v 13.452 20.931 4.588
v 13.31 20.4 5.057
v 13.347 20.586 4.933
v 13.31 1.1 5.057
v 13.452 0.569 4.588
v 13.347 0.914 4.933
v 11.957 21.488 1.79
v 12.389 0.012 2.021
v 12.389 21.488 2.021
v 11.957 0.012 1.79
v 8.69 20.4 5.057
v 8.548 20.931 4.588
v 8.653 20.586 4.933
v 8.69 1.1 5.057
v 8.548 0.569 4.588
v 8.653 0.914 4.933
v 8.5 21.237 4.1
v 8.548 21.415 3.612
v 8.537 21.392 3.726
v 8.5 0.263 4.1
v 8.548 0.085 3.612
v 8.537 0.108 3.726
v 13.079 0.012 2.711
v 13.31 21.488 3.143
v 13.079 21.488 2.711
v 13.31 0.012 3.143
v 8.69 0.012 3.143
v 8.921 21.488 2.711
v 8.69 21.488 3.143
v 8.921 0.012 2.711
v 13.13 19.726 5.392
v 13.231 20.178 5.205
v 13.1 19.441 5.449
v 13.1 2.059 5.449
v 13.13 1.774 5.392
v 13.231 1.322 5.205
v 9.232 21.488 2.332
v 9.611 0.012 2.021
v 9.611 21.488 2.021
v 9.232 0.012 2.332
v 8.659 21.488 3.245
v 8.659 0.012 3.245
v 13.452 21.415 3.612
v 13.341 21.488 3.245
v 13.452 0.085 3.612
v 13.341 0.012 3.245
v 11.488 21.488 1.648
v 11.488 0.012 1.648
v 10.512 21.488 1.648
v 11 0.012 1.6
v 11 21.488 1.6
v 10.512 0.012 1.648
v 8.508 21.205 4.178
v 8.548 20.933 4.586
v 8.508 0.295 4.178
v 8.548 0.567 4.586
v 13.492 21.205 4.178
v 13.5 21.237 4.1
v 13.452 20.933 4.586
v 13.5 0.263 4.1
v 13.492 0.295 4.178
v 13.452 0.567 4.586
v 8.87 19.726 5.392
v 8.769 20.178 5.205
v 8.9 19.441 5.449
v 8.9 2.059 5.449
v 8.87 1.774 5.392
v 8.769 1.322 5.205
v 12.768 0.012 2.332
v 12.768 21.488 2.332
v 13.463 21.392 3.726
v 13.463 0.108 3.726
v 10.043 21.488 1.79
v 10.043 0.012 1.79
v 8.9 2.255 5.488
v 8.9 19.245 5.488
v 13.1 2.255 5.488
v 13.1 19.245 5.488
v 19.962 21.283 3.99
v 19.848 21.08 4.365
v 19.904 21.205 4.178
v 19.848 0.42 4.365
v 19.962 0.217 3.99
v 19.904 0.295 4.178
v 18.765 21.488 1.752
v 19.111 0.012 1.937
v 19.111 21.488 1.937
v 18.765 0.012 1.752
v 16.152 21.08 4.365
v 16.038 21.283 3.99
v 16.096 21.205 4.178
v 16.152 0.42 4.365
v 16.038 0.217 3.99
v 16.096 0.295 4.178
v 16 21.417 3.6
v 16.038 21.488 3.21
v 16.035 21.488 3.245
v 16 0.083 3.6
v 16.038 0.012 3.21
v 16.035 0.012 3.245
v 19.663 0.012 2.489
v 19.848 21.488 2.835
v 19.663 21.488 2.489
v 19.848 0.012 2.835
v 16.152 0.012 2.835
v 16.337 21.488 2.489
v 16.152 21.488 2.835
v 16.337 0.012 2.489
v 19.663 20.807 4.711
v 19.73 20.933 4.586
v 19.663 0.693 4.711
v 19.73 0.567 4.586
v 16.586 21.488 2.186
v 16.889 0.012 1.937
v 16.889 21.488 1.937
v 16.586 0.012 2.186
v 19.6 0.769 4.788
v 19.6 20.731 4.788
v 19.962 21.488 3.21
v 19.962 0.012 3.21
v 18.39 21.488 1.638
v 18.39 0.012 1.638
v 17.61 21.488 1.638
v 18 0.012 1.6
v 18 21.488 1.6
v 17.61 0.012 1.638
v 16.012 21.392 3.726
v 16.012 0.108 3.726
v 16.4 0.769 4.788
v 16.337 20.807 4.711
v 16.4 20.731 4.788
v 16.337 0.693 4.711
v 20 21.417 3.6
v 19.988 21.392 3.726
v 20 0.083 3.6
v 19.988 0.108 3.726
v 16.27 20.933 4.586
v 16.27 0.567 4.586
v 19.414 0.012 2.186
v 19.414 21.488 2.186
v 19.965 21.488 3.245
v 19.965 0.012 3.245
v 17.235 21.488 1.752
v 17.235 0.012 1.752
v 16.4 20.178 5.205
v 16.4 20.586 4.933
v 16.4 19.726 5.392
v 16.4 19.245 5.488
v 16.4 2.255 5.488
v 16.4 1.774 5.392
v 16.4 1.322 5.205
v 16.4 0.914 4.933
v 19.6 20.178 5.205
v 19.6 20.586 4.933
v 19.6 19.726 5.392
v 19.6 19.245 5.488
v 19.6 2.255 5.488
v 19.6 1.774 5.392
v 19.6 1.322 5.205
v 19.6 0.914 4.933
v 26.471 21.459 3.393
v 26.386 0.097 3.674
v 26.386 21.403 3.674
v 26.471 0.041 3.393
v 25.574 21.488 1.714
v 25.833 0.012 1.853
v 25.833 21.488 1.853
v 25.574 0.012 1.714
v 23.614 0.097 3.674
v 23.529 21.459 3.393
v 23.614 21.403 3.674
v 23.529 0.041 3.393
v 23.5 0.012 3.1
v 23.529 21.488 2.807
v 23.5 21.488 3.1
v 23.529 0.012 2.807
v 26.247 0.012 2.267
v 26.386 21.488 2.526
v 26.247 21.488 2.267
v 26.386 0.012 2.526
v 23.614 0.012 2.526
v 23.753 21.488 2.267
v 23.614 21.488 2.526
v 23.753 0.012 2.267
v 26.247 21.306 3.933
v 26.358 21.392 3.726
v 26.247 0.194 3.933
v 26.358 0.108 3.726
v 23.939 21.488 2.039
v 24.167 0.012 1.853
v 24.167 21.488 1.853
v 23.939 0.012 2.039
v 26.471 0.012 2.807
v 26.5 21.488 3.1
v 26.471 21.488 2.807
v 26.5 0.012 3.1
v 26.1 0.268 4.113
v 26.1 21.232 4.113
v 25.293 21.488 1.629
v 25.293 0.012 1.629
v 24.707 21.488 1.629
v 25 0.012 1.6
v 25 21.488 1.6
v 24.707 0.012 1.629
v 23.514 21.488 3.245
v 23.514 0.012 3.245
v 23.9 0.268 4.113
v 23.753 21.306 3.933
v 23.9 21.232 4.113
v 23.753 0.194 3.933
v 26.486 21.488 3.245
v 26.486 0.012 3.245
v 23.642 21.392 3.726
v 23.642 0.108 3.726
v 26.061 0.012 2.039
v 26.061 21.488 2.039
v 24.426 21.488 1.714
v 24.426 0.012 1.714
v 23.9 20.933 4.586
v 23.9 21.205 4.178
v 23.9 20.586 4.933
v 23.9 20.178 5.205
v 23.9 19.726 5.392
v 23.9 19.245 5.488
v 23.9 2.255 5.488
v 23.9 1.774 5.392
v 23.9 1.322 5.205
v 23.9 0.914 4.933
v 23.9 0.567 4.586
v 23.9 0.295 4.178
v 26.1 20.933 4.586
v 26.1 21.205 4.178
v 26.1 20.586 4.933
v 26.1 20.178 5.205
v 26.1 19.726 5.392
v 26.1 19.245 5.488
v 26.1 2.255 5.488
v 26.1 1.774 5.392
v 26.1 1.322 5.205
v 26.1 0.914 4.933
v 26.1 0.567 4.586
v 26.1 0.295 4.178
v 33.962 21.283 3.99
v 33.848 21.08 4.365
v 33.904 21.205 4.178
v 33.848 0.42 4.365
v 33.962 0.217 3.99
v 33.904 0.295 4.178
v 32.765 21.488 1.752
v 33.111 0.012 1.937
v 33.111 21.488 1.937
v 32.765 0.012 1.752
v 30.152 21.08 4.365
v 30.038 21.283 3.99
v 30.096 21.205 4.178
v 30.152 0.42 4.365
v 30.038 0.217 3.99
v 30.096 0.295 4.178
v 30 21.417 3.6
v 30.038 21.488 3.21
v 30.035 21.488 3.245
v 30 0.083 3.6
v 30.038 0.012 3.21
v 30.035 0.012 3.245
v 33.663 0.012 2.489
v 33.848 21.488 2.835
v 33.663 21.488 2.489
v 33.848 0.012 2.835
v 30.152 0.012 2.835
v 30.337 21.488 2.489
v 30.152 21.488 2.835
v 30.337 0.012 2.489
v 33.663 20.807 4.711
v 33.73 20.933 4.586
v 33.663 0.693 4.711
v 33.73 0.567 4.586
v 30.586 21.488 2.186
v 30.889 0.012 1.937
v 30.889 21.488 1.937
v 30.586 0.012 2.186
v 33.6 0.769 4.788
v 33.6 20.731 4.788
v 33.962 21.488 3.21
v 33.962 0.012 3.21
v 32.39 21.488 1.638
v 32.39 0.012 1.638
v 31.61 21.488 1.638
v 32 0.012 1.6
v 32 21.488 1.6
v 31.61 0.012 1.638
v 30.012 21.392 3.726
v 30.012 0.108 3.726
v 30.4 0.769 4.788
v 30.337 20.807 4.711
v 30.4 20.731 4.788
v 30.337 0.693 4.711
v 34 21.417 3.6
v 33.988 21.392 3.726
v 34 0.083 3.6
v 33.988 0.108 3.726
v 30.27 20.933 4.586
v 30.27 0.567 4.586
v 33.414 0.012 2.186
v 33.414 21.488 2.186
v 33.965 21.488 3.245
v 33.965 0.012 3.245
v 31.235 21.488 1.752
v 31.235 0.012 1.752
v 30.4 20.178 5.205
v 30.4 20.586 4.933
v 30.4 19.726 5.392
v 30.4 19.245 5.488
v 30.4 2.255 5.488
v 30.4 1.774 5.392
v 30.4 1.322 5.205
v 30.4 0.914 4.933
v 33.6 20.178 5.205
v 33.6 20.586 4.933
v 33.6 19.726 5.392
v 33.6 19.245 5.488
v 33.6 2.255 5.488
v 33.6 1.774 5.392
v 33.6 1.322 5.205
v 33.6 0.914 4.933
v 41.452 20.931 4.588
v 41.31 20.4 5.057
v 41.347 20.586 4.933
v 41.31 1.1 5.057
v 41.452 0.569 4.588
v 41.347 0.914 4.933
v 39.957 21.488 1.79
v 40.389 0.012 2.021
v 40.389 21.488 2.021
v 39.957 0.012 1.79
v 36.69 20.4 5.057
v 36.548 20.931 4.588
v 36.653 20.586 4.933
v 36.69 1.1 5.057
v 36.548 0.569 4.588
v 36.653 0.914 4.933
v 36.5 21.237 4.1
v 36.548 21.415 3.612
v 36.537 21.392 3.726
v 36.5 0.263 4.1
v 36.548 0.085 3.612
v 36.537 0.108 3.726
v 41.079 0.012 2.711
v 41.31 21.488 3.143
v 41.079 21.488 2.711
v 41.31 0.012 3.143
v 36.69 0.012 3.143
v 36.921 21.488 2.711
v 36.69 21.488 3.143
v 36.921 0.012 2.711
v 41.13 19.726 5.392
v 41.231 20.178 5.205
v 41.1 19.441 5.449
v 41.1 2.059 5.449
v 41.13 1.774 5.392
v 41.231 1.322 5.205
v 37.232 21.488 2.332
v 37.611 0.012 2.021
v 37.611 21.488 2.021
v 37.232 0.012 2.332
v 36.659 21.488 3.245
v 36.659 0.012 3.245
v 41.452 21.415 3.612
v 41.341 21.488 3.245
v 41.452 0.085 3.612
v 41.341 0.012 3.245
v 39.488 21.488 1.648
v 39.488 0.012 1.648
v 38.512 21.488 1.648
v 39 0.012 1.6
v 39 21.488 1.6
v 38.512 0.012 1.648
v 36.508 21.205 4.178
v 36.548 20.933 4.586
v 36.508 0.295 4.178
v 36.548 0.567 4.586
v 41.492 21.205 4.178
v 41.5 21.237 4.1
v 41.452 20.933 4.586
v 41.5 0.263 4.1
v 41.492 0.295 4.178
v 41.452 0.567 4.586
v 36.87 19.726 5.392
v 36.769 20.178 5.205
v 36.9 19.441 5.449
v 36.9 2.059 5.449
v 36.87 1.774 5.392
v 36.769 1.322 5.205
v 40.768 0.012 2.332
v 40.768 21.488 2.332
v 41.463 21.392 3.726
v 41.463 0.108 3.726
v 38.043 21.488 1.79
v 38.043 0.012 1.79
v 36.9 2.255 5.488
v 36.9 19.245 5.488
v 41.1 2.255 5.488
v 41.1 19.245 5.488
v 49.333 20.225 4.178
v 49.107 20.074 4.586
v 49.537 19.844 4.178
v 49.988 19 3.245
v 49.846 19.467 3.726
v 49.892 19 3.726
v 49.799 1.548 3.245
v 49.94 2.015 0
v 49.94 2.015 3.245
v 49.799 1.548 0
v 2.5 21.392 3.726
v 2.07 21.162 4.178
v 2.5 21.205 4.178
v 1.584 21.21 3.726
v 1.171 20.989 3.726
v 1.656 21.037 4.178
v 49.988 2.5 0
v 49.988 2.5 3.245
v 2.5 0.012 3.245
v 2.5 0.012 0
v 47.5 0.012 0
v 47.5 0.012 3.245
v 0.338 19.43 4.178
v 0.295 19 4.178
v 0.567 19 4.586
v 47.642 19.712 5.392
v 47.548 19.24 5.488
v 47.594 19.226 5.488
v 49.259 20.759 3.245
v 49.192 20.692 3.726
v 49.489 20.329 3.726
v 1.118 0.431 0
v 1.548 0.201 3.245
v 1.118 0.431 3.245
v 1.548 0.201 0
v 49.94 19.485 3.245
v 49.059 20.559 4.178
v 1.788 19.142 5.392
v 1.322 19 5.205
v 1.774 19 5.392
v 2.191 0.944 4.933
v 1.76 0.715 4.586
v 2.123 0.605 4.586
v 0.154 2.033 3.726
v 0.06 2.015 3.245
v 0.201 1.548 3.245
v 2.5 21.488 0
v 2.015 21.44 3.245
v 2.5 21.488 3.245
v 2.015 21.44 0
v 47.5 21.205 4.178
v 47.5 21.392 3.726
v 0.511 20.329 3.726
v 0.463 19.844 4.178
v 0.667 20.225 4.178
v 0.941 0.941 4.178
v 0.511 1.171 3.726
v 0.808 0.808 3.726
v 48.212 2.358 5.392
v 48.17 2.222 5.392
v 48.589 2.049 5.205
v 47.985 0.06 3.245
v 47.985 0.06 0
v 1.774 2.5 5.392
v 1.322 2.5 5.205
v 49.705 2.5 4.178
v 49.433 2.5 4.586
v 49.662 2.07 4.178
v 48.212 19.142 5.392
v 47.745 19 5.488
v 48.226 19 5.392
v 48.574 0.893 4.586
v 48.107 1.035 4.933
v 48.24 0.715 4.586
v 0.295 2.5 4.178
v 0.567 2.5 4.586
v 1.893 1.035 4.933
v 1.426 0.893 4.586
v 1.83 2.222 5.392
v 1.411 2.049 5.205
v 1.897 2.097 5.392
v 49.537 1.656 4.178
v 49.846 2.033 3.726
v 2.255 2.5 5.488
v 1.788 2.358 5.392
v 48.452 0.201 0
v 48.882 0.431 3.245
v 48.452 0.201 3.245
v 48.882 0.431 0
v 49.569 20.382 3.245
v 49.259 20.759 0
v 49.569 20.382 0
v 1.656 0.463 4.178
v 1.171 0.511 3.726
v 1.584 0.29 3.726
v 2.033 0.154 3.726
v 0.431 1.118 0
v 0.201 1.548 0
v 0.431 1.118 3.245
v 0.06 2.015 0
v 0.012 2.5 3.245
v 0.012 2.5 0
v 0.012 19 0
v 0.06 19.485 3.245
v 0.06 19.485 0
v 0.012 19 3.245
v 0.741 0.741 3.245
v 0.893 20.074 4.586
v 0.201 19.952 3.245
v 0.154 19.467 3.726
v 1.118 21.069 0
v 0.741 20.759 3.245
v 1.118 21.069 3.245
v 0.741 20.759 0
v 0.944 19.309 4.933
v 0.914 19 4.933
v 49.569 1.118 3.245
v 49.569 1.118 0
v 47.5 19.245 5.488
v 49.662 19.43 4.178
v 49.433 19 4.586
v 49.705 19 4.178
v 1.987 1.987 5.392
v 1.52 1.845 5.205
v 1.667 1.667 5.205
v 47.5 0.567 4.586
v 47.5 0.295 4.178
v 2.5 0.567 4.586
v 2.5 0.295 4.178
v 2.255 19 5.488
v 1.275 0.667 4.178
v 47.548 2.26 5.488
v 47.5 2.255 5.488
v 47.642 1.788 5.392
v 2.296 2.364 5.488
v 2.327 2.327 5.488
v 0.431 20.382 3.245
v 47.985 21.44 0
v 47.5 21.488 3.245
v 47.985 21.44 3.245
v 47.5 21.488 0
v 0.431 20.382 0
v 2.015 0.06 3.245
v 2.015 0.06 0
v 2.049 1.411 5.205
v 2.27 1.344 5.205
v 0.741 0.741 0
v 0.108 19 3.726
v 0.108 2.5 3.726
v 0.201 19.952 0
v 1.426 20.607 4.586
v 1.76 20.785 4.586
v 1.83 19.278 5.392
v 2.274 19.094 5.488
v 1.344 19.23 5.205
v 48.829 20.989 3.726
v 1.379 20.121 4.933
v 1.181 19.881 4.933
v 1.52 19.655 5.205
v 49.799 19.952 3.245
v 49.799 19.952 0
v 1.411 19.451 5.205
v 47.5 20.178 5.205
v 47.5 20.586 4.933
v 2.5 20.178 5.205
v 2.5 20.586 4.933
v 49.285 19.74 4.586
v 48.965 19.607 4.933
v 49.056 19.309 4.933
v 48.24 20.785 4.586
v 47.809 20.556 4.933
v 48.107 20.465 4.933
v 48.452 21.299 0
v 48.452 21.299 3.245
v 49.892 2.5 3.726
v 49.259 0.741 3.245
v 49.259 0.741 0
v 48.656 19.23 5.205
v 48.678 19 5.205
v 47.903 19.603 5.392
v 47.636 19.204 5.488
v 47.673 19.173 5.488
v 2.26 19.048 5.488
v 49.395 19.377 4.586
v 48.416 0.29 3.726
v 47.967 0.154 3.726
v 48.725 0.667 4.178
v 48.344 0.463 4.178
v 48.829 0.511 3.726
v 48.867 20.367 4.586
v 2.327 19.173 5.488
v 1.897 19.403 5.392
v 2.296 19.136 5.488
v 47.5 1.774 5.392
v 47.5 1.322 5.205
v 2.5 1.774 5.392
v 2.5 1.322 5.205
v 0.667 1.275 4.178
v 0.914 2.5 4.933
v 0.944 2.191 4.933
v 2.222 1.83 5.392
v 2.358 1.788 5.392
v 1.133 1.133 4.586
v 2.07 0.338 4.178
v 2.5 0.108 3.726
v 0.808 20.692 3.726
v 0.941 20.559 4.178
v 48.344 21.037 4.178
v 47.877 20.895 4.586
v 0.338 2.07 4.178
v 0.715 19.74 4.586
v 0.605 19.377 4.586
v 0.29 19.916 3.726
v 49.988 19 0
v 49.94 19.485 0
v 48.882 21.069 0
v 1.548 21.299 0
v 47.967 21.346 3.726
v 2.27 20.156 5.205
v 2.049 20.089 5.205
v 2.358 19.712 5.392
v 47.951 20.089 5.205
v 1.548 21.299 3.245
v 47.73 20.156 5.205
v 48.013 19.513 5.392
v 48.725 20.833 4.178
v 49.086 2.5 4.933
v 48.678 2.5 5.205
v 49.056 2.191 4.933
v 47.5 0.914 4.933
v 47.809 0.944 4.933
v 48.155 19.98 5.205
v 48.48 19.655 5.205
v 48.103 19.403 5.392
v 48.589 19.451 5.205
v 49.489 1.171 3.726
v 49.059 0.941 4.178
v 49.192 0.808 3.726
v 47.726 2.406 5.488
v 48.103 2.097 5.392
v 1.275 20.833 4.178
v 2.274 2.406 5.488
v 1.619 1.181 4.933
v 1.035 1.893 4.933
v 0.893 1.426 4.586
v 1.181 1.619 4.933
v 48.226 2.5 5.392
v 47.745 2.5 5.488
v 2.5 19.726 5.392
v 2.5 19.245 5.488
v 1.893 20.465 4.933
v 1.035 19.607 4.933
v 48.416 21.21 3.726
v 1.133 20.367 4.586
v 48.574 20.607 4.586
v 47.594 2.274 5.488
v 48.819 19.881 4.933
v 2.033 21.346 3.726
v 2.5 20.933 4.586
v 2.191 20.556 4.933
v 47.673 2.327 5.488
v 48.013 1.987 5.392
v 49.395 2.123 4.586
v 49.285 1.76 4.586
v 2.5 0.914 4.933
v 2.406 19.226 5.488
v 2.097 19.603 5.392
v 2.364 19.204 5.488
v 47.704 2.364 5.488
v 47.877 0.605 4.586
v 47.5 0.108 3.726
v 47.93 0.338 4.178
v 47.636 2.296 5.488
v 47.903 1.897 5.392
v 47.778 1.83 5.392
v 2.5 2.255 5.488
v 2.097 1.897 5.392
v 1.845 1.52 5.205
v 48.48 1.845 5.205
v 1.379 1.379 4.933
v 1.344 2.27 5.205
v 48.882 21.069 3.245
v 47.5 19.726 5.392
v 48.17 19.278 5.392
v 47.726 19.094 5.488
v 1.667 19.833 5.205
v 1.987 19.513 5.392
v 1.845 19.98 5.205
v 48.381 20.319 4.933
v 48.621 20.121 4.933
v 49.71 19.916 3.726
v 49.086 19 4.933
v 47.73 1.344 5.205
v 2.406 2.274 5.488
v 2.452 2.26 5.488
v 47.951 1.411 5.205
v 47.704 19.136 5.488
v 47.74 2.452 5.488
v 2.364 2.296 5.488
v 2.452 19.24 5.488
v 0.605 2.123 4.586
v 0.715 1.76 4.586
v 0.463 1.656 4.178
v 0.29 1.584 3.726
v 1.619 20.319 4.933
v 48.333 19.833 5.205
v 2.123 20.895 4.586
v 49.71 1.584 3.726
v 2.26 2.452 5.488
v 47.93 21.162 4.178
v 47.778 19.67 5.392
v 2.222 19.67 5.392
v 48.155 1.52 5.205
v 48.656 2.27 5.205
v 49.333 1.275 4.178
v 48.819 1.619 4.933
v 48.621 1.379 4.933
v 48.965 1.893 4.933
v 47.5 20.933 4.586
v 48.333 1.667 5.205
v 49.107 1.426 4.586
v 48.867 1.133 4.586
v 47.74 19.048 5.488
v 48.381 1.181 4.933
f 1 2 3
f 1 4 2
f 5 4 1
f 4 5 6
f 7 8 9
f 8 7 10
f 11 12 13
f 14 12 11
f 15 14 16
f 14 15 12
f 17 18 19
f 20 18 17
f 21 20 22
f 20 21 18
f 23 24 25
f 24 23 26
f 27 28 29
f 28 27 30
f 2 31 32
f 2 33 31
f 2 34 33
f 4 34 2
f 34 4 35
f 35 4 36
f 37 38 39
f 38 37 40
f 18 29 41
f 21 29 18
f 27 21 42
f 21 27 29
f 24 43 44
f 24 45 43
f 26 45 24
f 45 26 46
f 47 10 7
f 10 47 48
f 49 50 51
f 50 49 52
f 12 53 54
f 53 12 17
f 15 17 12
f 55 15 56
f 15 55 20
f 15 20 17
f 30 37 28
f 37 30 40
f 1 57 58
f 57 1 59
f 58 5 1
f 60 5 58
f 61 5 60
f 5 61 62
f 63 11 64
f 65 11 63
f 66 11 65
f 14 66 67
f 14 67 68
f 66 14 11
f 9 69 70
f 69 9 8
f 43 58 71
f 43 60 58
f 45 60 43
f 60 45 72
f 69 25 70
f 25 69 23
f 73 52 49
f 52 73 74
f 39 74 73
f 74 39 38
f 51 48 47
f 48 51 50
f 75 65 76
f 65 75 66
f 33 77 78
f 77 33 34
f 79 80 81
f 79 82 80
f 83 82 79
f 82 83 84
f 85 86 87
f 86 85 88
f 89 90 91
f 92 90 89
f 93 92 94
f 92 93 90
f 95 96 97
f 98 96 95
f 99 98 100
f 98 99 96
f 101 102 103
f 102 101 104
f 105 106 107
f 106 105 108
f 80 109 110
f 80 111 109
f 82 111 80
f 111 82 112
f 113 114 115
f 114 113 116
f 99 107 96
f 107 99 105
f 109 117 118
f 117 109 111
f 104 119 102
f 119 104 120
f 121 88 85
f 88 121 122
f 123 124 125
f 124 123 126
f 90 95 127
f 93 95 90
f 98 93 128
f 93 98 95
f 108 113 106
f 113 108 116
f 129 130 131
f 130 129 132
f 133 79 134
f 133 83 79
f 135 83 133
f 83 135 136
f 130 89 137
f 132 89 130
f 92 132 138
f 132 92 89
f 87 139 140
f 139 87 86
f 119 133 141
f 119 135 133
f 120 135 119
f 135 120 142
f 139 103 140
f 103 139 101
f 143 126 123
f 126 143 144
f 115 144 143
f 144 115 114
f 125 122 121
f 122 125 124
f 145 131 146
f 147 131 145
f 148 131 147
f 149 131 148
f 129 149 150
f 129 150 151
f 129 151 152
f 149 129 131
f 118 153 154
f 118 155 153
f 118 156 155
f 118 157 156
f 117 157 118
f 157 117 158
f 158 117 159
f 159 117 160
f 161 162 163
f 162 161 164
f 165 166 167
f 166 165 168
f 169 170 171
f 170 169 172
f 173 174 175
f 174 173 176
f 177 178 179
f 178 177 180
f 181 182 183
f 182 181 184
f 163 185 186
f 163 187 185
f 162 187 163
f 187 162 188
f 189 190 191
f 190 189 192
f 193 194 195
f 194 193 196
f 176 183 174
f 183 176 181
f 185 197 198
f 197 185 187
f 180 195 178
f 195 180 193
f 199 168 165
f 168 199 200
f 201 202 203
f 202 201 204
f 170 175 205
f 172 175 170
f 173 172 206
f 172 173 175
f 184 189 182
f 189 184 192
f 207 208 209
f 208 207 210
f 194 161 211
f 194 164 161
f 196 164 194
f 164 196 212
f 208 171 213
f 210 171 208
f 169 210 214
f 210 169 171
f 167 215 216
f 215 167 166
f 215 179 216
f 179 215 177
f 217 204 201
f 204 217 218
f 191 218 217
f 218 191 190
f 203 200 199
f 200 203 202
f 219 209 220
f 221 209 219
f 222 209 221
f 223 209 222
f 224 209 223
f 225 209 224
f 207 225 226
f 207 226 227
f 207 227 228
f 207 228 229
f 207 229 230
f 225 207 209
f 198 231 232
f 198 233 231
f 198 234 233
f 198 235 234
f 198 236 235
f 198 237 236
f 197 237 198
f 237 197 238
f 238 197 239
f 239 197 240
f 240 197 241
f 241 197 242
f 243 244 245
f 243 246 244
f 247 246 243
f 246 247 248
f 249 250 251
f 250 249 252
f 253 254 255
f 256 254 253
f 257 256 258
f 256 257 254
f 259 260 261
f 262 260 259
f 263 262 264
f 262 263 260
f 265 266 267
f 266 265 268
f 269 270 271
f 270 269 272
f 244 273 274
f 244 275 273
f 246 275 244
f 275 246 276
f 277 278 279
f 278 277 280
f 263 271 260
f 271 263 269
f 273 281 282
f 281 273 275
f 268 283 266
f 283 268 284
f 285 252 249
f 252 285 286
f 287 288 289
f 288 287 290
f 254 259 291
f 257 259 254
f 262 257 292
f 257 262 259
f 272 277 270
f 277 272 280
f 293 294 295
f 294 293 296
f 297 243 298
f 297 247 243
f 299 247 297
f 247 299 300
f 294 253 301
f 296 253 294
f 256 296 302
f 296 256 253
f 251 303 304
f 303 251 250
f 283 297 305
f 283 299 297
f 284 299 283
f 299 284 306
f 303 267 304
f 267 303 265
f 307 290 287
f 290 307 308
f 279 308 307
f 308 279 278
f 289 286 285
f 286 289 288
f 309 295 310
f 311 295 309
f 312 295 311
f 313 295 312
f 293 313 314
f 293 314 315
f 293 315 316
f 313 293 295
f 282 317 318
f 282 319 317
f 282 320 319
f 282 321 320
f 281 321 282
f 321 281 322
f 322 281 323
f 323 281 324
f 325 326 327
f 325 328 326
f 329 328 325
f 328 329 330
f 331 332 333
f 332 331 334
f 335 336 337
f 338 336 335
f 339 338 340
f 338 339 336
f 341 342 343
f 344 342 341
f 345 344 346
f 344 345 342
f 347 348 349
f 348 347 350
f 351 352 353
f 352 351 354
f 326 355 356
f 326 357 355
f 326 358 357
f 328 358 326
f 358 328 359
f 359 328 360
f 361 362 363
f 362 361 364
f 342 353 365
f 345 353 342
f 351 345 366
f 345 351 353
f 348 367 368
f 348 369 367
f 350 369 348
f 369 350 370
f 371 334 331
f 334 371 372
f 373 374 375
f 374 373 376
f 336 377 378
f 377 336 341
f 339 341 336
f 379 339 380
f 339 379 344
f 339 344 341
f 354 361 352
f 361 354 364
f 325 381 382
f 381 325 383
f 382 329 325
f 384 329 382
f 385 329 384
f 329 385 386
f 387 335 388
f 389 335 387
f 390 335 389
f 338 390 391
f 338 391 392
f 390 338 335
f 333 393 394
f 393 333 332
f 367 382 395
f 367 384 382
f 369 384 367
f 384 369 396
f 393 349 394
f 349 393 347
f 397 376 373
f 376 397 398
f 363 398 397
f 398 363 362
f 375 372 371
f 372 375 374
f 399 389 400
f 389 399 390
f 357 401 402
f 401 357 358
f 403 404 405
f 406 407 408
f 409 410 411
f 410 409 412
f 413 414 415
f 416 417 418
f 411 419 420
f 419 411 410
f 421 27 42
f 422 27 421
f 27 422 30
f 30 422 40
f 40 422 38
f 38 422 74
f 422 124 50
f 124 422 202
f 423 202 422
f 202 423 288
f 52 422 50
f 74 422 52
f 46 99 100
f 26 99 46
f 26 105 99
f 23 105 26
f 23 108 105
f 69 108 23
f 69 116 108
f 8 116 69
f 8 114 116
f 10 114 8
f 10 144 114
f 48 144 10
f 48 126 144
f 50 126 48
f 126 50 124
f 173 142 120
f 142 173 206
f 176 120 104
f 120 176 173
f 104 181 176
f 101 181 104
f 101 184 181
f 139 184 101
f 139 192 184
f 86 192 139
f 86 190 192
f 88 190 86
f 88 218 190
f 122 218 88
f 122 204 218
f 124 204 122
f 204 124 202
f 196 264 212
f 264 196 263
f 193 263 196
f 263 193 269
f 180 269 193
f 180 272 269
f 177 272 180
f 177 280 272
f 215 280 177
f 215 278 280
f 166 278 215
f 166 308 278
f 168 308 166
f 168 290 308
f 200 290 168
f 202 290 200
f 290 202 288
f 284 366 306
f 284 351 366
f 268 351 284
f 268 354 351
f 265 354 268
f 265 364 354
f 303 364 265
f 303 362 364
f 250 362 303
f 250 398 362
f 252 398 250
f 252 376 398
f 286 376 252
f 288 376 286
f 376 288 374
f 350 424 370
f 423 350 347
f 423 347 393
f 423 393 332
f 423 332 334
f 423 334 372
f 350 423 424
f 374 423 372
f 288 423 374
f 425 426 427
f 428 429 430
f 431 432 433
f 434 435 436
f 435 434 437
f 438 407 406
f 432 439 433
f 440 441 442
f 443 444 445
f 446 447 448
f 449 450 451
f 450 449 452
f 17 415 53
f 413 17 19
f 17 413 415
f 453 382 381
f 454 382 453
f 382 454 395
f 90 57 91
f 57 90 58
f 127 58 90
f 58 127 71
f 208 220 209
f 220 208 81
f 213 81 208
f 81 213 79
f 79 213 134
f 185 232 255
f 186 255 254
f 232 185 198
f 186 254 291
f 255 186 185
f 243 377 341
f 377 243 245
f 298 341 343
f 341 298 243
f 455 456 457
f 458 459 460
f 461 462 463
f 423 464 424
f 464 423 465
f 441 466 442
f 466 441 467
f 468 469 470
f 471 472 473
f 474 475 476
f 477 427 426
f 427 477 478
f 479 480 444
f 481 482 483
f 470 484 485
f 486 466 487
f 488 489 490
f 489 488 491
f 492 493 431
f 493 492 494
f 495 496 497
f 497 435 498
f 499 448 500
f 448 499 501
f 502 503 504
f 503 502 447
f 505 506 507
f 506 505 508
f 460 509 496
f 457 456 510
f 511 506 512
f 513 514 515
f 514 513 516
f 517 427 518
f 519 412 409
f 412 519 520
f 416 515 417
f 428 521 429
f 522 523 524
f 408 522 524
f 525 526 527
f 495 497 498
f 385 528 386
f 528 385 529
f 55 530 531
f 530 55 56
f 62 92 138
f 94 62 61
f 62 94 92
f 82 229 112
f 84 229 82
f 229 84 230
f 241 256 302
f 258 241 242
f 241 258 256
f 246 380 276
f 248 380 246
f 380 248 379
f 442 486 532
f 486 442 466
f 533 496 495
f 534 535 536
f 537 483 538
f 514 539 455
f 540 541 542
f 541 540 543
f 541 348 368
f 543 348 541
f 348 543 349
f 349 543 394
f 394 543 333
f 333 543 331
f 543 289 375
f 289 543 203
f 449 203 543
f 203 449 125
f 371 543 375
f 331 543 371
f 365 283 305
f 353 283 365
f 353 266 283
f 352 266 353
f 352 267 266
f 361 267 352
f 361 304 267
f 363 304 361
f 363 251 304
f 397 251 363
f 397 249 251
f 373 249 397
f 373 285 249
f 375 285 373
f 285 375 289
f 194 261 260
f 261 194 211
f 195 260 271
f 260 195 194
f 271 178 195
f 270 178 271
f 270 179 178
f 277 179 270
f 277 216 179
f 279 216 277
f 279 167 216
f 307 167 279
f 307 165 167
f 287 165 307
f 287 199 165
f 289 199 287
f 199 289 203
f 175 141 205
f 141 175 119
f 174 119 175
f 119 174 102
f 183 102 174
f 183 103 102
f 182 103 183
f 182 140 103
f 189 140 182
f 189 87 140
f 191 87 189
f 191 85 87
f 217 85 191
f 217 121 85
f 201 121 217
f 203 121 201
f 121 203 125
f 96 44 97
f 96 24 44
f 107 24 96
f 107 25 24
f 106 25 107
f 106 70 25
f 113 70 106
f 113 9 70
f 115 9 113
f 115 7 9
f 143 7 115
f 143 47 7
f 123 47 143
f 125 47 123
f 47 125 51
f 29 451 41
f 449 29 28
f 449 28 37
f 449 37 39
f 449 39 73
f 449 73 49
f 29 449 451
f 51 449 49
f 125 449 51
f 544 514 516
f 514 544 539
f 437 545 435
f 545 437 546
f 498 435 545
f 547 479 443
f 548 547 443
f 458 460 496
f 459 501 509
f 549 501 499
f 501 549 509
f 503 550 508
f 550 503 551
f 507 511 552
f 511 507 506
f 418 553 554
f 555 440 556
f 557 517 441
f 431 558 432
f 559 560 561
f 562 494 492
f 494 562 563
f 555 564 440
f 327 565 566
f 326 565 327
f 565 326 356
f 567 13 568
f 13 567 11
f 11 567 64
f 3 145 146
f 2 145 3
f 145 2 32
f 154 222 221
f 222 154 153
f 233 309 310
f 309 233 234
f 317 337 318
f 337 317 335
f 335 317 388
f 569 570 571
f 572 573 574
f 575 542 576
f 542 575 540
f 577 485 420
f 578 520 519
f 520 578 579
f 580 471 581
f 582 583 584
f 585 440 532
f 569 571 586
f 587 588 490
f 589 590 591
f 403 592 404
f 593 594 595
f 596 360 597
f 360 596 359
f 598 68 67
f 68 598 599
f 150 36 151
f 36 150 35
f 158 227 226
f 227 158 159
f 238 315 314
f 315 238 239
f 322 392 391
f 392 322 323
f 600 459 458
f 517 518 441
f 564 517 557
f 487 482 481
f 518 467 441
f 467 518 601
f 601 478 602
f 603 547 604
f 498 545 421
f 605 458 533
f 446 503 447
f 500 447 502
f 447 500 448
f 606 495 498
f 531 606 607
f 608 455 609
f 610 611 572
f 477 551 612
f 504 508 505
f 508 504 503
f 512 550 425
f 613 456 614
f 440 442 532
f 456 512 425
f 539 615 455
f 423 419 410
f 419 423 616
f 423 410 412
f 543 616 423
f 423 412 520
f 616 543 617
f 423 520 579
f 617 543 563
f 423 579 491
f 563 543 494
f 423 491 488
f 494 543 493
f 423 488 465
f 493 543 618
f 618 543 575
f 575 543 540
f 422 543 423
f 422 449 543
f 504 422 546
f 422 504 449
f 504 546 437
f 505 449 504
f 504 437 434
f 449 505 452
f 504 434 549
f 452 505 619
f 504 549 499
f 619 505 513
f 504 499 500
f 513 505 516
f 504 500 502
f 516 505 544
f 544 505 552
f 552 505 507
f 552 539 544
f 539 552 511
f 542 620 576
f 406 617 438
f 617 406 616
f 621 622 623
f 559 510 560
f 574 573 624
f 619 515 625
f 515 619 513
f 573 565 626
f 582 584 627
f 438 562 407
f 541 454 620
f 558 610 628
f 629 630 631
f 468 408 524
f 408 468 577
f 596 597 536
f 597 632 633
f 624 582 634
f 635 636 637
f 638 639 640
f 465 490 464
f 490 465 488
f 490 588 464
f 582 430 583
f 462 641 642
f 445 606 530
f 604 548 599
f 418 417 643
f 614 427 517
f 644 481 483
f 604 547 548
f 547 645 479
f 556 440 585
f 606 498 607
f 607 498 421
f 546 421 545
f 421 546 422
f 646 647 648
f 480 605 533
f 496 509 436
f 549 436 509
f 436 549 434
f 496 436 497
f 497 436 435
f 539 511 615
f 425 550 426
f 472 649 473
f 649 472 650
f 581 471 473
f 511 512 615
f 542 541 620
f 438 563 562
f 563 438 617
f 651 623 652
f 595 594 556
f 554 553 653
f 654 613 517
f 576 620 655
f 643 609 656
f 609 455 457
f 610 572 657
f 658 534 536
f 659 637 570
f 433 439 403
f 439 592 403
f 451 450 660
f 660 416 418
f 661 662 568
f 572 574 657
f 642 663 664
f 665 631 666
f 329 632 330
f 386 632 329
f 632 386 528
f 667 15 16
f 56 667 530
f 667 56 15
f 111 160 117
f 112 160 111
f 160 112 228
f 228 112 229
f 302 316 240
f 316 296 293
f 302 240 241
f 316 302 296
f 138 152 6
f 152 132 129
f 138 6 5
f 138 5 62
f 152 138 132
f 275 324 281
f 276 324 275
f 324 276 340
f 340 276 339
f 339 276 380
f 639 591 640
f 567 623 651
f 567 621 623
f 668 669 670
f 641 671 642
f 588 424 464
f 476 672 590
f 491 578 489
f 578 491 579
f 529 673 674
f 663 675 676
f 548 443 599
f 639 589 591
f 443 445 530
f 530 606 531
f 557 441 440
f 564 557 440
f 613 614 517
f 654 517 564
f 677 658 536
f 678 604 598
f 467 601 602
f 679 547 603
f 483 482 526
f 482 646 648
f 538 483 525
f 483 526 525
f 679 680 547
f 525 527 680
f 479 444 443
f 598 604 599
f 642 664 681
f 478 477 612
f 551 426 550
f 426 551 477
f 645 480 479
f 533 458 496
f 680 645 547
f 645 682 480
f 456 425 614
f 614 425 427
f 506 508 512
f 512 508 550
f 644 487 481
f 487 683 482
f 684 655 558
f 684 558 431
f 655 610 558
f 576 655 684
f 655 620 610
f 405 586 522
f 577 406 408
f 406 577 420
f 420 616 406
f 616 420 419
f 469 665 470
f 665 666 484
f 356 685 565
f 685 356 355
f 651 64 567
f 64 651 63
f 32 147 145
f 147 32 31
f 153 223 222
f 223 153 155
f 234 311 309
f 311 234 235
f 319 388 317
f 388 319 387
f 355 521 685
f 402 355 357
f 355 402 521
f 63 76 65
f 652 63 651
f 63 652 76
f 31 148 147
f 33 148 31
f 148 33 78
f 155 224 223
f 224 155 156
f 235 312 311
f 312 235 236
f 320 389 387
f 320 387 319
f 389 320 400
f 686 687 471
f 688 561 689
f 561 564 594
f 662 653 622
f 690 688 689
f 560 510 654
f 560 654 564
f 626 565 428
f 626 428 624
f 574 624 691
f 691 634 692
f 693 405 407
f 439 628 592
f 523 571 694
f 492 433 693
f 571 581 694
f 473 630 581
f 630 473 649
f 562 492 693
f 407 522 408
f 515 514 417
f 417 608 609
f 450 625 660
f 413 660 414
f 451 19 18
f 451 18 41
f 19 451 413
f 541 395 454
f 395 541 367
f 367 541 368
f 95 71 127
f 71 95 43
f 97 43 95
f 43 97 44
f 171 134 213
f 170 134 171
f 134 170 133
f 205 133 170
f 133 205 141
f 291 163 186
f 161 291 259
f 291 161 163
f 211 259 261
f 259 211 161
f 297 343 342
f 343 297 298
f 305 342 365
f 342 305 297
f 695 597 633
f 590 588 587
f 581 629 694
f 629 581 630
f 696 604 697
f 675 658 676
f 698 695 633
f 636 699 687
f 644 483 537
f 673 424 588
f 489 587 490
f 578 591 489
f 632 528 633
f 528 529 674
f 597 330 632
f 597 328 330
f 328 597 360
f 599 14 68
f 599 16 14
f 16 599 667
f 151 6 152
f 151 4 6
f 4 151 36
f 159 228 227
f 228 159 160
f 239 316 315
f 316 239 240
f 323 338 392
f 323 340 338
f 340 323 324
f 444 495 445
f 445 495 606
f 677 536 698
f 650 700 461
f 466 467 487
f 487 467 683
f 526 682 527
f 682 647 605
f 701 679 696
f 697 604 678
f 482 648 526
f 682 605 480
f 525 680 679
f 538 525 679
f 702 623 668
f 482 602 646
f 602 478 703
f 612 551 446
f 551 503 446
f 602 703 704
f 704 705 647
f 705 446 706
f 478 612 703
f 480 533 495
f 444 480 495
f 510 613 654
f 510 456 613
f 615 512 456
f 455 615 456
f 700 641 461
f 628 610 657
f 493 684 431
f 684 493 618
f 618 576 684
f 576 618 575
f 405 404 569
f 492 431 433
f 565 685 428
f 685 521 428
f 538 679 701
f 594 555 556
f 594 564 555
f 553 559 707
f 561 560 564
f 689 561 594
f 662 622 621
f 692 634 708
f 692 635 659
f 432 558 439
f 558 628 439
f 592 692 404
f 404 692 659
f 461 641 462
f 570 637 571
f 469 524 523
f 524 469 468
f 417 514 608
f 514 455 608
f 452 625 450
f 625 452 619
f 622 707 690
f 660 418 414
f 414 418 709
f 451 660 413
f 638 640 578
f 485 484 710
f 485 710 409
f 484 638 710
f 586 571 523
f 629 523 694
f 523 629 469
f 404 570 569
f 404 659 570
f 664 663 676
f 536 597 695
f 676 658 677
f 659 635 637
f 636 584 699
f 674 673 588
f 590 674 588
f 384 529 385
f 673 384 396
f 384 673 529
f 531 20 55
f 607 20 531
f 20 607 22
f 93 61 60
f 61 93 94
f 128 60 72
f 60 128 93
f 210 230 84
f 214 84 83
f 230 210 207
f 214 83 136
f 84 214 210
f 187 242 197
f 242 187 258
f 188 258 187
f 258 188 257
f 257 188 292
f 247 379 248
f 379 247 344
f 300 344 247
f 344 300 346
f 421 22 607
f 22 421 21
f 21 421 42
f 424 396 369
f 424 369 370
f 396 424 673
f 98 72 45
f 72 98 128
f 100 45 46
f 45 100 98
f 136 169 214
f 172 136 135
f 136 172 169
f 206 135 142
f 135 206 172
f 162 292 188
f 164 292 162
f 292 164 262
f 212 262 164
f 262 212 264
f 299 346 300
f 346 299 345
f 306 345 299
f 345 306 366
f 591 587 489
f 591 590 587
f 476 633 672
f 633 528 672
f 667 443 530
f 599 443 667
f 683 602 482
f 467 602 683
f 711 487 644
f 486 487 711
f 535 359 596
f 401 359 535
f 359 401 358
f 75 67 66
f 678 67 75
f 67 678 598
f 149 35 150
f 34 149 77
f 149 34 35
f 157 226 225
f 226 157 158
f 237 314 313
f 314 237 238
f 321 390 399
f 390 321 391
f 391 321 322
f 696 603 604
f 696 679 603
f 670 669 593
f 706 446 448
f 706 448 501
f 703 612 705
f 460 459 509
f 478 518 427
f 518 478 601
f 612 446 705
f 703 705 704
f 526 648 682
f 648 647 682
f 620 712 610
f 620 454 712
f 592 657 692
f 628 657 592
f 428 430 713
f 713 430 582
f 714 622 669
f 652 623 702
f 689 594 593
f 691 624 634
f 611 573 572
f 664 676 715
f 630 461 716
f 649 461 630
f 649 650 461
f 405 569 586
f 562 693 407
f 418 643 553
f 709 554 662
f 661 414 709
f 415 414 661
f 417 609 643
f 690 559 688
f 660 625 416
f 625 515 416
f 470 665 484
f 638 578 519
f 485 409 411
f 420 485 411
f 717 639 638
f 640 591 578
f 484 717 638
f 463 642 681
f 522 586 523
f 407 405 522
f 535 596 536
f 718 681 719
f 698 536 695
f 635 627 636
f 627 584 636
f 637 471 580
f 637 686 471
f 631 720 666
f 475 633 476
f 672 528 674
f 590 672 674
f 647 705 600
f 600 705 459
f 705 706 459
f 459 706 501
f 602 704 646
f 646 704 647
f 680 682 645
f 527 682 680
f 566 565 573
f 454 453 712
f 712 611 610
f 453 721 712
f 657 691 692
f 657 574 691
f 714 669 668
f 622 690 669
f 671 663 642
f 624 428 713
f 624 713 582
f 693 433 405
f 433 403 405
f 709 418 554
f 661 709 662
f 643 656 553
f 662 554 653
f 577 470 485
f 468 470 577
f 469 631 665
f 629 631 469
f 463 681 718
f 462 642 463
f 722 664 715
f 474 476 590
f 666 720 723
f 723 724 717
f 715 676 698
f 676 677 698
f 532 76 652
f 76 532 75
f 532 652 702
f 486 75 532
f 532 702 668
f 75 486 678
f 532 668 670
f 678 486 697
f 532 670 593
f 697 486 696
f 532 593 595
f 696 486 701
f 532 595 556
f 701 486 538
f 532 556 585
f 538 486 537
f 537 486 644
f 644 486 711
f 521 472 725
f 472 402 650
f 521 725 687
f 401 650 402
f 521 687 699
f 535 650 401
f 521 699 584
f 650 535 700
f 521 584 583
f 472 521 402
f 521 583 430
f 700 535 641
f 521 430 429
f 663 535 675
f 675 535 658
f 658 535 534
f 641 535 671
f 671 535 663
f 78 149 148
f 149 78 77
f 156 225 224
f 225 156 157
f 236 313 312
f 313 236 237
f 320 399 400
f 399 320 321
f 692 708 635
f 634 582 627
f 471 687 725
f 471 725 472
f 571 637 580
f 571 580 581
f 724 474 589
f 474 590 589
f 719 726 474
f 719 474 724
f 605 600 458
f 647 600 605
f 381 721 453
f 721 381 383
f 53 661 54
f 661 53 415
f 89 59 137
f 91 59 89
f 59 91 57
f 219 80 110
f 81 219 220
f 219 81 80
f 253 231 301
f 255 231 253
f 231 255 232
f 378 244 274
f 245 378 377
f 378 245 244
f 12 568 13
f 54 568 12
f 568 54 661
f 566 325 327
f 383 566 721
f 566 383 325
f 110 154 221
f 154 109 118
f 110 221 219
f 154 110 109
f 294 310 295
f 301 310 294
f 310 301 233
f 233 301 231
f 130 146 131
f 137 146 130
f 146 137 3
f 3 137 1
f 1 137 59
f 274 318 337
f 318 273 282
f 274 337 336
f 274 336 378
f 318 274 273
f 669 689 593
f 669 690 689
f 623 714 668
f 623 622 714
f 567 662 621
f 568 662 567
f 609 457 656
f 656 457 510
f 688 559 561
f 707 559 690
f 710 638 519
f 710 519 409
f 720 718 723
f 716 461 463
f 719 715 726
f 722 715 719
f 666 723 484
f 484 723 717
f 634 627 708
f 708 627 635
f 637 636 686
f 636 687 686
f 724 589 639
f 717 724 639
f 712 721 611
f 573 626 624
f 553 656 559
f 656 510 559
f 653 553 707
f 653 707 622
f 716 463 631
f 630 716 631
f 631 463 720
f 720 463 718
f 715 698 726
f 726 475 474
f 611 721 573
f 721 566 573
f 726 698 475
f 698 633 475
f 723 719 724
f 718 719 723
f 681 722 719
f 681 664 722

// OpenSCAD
cable_canal_diameter = [5, 4, 3, 4, 5];

cable_canal_max_diameter = 5;

cable_canal_diameter_offset = 0.8;

canal_gutter = 2;

base_width = 50;

base_length = 21.5;

base_height = 3;

base_rounding = 2.5;

cable_canal_z_offset = 1.6;

$fn = 32;

module base() {
    translate([base_rounding, base_rounding]) {
        minkowski() {
            cube([base_width - base_rounding * 2, base_length - base_rounding * 2, base_height]);
            difference() {
                sphere(r = base_rounding, center = false);
                translate([-base_rounding, -base_rounding, -base_rounding])
                    cube([base_rounding * 2, base_rounding * 2, base_rounding]);
            }
        }
    }
}

module canal(diameter) {
    translate([diameter / 2, base_length + 1, cable_canal_z_offset]) {
        rotate([0, -90, 90]) {
            translate([diameter / 2, diameter / 2, 0])
                cylinder(r=diameter/2, h=base_length + 2);

            translate([diameter / 2, cable_canal_diameter_offset / 2, 0])
                cube([10, diameter - cable_canal_diameter_offset, base_length + 2]);
        }
    }
}


difference() {
    base();
    if (len(cable_canal_diameter) == 1) {
        sx = base_width / 2;
        translate([sx, 0, 0])
            canal(cable_canal_diameter[0]);
    } else {
        canals_width = cable_canal_max_diameter * (len(cable_canal_diameter) - 1) + canal_gutter * (len(cable_canal_diameter) - 1);
        sx = base_width / 2 - canals_width / 2;
        for(i=[0:len(cable_canal_diameter)-1]) {
            pos_x = sx + i * cable_canal_max_diameter + canal_gutter * i;
            translate([pos_x, 0, 0])
                canal(cable_canal_diameter[i]);
        }
    }
}
